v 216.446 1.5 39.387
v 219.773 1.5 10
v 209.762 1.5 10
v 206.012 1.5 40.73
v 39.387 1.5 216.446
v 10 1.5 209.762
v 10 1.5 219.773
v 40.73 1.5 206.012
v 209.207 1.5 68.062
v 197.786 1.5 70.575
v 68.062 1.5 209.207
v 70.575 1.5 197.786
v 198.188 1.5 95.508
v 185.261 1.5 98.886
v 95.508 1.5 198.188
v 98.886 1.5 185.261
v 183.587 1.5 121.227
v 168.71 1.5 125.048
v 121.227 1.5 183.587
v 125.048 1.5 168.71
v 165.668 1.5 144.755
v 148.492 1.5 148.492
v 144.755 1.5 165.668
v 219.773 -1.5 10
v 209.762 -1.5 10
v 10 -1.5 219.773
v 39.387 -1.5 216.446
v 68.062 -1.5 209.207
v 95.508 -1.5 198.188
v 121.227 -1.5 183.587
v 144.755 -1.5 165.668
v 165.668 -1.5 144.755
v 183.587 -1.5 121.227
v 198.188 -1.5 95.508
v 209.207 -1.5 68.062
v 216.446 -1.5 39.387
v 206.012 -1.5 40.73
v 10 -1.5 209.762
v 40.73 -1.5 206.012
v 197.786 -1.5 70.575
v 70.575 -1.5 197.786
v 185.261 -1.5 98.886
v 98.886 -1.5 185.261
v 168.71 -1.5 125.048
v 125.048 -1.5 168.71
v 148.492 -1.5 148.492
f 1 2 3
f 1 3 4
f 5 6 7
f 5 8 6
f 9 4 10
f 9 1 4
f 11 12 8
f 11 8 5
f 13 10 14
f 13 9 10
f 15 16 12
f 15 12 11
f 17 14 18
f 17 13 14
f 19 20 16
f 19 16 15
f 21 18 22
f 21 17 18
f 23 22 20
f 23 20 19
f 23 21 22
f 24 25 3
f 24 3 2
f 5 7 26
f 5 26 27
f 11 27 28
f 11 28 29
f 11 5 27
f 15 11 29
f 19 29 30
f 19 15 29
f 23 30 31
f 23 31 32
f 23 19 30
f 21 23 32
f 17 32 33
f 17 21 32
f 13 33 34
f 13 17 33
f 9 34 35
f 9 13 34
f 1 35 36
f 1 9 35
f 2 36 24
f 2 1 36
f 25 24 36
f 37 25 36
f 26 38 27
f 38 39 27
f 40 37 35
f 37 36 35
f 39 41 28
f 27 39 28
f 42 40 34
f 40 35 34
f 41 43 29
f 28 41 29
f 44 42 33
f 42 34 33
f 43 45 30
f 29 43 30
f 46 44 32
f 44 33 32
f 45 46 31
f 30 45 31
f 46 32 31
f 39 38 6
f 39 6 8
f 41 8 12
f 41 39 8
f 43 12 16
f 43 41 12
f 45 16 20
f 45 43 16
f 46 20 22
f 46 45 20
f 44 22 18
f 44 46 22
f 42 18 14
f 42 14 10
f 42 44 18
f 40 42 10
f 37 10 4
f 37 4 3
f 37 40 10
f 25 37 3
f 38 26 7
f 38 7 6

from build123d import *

# Parameters (mm, degrees)
SKETCH1_R            = 220
SKETCH1_R_2          = 210
BOSS_EXTRUDE1_DEPTH  = 1.5
QUADRUPLE_DEPTH      = 312.130599588
QUADRUPLE_DEPTH_BACK = 312.130599588
SKETCH2_W            = 20
SKETCH2_H            = 440
SKETCH2_W_2          = 440
SKETCH2_H_2          = 20
SKETCH4_W            = 439.545219516
SKETCH4_H            = 3
HALF_DEPTH           = 311.809024965
SKETCH5_W            = 439.545219516
SKETCH5_H            = 3
QUARTER_DEPTH        = 311.809024965


with BuildPart() as part:
    # Sketch1 → Boss-Extrude1 (new, symmetric)
    with BuildSketch(Plane(origin=(0, 0, 0), x_dir=(1, 0, 0), z_dir=(0, 1, 0))):
        with Locations(Location((0, 0, 0), (0, 0, 270))):
            Circle(SKETCH1_R)
        with Locations(Location((0, 0, 0), (0, 0, 270))):
            Circle(SKETCH1_R_2, mode=Mode.SUBTRACT)
    extrude(amount=BOSS_EXTRUDE1_DEPTH, both=True)

    # Sketch2 → quadruple (cut, two sides: drawn at the far end of the back side and taken through both)
    with BuildSketch(Plane(origin=(0, 0, 0), x_dir=(1, 0, 0), z_dir=(0, 1, 0)).offset(-QUADRUPLE_DEPTH_BACK)):
        Rectangle(SKETCH2_W, SKETCH2_H)
        Rectangle(SKETCH2_W_2, SKETCH2_H_2)
    extrude(amount=QUADRUPLE_DEPTH + QUADRUPLE_DEPTH_BACK, mode=Mode.SUBTRACT)


with BuildPart() as quadruple_piece_1:
    # of the separate pieces the step leaves, piece 1, a body of its own (quadruple_pieces)
    add(part.part.solids().sort_by_distance((-219.772609758, -1.5, 10))[0])

    # Sketch5 → quarter (cut, through all)
    with BuildSketch(Plane(origin=(0, 0, 0), x_dir=(0, 0, -1), z_dir=(1, 0, 0))):
        Rectangle(SKETCH5_W, SKETCH5_H)
    extrude(amount=-QUARTER_DEPTH, mode=Mode.SUBTRACT)


with BuildPart() as quadruple_piece_2:
    # of the separate pieces the step leaves, piece 2, a body of its own (quadruple_pieces)
    add(part.part.solids().sort_by_distance((-10, 1.5, -219.772609758))[0])


with BuildPart() as quadruple_piece_3:
    # of the separate pieces the step leaves, piece 3, a body of its own (quadruple_pieces)
    add(part.part.solids().sort_by_distance((10, -1.5, 219.772609758))[0])


with BuildPart() as quadruple_piece_4:
    # of the separate pieces the step leaves, piece 4, a body of its own (quadruple_pieces)
    add(part.part.solids().sort_by_distance((209.761769634, 1.5, -10))[0])


with BuildPart() as half_tool:
    # Sketch4 → half (new, through all)
    with BuildSketch(Plane.XY):
        Rectangle(SKETCH4_W, SKETCH4_H)
    extrude(amount=-HALF_DEPTH)


with BuildPart() as quadruple_piece_2_1:
    add(quadruple_piece_2.part)

    # half: cut by half_tool
    add(half_tool.part, mode=Mode.SUBTRACT)


with BuildPart() as quadruple_piece_4_1:
    add(quadruple_piece_4.part)

    # half: cut by half_tool
    add(half_tool.part, mode=Mode.SUBTRACT)


solid = quadruple_piece_3.part
